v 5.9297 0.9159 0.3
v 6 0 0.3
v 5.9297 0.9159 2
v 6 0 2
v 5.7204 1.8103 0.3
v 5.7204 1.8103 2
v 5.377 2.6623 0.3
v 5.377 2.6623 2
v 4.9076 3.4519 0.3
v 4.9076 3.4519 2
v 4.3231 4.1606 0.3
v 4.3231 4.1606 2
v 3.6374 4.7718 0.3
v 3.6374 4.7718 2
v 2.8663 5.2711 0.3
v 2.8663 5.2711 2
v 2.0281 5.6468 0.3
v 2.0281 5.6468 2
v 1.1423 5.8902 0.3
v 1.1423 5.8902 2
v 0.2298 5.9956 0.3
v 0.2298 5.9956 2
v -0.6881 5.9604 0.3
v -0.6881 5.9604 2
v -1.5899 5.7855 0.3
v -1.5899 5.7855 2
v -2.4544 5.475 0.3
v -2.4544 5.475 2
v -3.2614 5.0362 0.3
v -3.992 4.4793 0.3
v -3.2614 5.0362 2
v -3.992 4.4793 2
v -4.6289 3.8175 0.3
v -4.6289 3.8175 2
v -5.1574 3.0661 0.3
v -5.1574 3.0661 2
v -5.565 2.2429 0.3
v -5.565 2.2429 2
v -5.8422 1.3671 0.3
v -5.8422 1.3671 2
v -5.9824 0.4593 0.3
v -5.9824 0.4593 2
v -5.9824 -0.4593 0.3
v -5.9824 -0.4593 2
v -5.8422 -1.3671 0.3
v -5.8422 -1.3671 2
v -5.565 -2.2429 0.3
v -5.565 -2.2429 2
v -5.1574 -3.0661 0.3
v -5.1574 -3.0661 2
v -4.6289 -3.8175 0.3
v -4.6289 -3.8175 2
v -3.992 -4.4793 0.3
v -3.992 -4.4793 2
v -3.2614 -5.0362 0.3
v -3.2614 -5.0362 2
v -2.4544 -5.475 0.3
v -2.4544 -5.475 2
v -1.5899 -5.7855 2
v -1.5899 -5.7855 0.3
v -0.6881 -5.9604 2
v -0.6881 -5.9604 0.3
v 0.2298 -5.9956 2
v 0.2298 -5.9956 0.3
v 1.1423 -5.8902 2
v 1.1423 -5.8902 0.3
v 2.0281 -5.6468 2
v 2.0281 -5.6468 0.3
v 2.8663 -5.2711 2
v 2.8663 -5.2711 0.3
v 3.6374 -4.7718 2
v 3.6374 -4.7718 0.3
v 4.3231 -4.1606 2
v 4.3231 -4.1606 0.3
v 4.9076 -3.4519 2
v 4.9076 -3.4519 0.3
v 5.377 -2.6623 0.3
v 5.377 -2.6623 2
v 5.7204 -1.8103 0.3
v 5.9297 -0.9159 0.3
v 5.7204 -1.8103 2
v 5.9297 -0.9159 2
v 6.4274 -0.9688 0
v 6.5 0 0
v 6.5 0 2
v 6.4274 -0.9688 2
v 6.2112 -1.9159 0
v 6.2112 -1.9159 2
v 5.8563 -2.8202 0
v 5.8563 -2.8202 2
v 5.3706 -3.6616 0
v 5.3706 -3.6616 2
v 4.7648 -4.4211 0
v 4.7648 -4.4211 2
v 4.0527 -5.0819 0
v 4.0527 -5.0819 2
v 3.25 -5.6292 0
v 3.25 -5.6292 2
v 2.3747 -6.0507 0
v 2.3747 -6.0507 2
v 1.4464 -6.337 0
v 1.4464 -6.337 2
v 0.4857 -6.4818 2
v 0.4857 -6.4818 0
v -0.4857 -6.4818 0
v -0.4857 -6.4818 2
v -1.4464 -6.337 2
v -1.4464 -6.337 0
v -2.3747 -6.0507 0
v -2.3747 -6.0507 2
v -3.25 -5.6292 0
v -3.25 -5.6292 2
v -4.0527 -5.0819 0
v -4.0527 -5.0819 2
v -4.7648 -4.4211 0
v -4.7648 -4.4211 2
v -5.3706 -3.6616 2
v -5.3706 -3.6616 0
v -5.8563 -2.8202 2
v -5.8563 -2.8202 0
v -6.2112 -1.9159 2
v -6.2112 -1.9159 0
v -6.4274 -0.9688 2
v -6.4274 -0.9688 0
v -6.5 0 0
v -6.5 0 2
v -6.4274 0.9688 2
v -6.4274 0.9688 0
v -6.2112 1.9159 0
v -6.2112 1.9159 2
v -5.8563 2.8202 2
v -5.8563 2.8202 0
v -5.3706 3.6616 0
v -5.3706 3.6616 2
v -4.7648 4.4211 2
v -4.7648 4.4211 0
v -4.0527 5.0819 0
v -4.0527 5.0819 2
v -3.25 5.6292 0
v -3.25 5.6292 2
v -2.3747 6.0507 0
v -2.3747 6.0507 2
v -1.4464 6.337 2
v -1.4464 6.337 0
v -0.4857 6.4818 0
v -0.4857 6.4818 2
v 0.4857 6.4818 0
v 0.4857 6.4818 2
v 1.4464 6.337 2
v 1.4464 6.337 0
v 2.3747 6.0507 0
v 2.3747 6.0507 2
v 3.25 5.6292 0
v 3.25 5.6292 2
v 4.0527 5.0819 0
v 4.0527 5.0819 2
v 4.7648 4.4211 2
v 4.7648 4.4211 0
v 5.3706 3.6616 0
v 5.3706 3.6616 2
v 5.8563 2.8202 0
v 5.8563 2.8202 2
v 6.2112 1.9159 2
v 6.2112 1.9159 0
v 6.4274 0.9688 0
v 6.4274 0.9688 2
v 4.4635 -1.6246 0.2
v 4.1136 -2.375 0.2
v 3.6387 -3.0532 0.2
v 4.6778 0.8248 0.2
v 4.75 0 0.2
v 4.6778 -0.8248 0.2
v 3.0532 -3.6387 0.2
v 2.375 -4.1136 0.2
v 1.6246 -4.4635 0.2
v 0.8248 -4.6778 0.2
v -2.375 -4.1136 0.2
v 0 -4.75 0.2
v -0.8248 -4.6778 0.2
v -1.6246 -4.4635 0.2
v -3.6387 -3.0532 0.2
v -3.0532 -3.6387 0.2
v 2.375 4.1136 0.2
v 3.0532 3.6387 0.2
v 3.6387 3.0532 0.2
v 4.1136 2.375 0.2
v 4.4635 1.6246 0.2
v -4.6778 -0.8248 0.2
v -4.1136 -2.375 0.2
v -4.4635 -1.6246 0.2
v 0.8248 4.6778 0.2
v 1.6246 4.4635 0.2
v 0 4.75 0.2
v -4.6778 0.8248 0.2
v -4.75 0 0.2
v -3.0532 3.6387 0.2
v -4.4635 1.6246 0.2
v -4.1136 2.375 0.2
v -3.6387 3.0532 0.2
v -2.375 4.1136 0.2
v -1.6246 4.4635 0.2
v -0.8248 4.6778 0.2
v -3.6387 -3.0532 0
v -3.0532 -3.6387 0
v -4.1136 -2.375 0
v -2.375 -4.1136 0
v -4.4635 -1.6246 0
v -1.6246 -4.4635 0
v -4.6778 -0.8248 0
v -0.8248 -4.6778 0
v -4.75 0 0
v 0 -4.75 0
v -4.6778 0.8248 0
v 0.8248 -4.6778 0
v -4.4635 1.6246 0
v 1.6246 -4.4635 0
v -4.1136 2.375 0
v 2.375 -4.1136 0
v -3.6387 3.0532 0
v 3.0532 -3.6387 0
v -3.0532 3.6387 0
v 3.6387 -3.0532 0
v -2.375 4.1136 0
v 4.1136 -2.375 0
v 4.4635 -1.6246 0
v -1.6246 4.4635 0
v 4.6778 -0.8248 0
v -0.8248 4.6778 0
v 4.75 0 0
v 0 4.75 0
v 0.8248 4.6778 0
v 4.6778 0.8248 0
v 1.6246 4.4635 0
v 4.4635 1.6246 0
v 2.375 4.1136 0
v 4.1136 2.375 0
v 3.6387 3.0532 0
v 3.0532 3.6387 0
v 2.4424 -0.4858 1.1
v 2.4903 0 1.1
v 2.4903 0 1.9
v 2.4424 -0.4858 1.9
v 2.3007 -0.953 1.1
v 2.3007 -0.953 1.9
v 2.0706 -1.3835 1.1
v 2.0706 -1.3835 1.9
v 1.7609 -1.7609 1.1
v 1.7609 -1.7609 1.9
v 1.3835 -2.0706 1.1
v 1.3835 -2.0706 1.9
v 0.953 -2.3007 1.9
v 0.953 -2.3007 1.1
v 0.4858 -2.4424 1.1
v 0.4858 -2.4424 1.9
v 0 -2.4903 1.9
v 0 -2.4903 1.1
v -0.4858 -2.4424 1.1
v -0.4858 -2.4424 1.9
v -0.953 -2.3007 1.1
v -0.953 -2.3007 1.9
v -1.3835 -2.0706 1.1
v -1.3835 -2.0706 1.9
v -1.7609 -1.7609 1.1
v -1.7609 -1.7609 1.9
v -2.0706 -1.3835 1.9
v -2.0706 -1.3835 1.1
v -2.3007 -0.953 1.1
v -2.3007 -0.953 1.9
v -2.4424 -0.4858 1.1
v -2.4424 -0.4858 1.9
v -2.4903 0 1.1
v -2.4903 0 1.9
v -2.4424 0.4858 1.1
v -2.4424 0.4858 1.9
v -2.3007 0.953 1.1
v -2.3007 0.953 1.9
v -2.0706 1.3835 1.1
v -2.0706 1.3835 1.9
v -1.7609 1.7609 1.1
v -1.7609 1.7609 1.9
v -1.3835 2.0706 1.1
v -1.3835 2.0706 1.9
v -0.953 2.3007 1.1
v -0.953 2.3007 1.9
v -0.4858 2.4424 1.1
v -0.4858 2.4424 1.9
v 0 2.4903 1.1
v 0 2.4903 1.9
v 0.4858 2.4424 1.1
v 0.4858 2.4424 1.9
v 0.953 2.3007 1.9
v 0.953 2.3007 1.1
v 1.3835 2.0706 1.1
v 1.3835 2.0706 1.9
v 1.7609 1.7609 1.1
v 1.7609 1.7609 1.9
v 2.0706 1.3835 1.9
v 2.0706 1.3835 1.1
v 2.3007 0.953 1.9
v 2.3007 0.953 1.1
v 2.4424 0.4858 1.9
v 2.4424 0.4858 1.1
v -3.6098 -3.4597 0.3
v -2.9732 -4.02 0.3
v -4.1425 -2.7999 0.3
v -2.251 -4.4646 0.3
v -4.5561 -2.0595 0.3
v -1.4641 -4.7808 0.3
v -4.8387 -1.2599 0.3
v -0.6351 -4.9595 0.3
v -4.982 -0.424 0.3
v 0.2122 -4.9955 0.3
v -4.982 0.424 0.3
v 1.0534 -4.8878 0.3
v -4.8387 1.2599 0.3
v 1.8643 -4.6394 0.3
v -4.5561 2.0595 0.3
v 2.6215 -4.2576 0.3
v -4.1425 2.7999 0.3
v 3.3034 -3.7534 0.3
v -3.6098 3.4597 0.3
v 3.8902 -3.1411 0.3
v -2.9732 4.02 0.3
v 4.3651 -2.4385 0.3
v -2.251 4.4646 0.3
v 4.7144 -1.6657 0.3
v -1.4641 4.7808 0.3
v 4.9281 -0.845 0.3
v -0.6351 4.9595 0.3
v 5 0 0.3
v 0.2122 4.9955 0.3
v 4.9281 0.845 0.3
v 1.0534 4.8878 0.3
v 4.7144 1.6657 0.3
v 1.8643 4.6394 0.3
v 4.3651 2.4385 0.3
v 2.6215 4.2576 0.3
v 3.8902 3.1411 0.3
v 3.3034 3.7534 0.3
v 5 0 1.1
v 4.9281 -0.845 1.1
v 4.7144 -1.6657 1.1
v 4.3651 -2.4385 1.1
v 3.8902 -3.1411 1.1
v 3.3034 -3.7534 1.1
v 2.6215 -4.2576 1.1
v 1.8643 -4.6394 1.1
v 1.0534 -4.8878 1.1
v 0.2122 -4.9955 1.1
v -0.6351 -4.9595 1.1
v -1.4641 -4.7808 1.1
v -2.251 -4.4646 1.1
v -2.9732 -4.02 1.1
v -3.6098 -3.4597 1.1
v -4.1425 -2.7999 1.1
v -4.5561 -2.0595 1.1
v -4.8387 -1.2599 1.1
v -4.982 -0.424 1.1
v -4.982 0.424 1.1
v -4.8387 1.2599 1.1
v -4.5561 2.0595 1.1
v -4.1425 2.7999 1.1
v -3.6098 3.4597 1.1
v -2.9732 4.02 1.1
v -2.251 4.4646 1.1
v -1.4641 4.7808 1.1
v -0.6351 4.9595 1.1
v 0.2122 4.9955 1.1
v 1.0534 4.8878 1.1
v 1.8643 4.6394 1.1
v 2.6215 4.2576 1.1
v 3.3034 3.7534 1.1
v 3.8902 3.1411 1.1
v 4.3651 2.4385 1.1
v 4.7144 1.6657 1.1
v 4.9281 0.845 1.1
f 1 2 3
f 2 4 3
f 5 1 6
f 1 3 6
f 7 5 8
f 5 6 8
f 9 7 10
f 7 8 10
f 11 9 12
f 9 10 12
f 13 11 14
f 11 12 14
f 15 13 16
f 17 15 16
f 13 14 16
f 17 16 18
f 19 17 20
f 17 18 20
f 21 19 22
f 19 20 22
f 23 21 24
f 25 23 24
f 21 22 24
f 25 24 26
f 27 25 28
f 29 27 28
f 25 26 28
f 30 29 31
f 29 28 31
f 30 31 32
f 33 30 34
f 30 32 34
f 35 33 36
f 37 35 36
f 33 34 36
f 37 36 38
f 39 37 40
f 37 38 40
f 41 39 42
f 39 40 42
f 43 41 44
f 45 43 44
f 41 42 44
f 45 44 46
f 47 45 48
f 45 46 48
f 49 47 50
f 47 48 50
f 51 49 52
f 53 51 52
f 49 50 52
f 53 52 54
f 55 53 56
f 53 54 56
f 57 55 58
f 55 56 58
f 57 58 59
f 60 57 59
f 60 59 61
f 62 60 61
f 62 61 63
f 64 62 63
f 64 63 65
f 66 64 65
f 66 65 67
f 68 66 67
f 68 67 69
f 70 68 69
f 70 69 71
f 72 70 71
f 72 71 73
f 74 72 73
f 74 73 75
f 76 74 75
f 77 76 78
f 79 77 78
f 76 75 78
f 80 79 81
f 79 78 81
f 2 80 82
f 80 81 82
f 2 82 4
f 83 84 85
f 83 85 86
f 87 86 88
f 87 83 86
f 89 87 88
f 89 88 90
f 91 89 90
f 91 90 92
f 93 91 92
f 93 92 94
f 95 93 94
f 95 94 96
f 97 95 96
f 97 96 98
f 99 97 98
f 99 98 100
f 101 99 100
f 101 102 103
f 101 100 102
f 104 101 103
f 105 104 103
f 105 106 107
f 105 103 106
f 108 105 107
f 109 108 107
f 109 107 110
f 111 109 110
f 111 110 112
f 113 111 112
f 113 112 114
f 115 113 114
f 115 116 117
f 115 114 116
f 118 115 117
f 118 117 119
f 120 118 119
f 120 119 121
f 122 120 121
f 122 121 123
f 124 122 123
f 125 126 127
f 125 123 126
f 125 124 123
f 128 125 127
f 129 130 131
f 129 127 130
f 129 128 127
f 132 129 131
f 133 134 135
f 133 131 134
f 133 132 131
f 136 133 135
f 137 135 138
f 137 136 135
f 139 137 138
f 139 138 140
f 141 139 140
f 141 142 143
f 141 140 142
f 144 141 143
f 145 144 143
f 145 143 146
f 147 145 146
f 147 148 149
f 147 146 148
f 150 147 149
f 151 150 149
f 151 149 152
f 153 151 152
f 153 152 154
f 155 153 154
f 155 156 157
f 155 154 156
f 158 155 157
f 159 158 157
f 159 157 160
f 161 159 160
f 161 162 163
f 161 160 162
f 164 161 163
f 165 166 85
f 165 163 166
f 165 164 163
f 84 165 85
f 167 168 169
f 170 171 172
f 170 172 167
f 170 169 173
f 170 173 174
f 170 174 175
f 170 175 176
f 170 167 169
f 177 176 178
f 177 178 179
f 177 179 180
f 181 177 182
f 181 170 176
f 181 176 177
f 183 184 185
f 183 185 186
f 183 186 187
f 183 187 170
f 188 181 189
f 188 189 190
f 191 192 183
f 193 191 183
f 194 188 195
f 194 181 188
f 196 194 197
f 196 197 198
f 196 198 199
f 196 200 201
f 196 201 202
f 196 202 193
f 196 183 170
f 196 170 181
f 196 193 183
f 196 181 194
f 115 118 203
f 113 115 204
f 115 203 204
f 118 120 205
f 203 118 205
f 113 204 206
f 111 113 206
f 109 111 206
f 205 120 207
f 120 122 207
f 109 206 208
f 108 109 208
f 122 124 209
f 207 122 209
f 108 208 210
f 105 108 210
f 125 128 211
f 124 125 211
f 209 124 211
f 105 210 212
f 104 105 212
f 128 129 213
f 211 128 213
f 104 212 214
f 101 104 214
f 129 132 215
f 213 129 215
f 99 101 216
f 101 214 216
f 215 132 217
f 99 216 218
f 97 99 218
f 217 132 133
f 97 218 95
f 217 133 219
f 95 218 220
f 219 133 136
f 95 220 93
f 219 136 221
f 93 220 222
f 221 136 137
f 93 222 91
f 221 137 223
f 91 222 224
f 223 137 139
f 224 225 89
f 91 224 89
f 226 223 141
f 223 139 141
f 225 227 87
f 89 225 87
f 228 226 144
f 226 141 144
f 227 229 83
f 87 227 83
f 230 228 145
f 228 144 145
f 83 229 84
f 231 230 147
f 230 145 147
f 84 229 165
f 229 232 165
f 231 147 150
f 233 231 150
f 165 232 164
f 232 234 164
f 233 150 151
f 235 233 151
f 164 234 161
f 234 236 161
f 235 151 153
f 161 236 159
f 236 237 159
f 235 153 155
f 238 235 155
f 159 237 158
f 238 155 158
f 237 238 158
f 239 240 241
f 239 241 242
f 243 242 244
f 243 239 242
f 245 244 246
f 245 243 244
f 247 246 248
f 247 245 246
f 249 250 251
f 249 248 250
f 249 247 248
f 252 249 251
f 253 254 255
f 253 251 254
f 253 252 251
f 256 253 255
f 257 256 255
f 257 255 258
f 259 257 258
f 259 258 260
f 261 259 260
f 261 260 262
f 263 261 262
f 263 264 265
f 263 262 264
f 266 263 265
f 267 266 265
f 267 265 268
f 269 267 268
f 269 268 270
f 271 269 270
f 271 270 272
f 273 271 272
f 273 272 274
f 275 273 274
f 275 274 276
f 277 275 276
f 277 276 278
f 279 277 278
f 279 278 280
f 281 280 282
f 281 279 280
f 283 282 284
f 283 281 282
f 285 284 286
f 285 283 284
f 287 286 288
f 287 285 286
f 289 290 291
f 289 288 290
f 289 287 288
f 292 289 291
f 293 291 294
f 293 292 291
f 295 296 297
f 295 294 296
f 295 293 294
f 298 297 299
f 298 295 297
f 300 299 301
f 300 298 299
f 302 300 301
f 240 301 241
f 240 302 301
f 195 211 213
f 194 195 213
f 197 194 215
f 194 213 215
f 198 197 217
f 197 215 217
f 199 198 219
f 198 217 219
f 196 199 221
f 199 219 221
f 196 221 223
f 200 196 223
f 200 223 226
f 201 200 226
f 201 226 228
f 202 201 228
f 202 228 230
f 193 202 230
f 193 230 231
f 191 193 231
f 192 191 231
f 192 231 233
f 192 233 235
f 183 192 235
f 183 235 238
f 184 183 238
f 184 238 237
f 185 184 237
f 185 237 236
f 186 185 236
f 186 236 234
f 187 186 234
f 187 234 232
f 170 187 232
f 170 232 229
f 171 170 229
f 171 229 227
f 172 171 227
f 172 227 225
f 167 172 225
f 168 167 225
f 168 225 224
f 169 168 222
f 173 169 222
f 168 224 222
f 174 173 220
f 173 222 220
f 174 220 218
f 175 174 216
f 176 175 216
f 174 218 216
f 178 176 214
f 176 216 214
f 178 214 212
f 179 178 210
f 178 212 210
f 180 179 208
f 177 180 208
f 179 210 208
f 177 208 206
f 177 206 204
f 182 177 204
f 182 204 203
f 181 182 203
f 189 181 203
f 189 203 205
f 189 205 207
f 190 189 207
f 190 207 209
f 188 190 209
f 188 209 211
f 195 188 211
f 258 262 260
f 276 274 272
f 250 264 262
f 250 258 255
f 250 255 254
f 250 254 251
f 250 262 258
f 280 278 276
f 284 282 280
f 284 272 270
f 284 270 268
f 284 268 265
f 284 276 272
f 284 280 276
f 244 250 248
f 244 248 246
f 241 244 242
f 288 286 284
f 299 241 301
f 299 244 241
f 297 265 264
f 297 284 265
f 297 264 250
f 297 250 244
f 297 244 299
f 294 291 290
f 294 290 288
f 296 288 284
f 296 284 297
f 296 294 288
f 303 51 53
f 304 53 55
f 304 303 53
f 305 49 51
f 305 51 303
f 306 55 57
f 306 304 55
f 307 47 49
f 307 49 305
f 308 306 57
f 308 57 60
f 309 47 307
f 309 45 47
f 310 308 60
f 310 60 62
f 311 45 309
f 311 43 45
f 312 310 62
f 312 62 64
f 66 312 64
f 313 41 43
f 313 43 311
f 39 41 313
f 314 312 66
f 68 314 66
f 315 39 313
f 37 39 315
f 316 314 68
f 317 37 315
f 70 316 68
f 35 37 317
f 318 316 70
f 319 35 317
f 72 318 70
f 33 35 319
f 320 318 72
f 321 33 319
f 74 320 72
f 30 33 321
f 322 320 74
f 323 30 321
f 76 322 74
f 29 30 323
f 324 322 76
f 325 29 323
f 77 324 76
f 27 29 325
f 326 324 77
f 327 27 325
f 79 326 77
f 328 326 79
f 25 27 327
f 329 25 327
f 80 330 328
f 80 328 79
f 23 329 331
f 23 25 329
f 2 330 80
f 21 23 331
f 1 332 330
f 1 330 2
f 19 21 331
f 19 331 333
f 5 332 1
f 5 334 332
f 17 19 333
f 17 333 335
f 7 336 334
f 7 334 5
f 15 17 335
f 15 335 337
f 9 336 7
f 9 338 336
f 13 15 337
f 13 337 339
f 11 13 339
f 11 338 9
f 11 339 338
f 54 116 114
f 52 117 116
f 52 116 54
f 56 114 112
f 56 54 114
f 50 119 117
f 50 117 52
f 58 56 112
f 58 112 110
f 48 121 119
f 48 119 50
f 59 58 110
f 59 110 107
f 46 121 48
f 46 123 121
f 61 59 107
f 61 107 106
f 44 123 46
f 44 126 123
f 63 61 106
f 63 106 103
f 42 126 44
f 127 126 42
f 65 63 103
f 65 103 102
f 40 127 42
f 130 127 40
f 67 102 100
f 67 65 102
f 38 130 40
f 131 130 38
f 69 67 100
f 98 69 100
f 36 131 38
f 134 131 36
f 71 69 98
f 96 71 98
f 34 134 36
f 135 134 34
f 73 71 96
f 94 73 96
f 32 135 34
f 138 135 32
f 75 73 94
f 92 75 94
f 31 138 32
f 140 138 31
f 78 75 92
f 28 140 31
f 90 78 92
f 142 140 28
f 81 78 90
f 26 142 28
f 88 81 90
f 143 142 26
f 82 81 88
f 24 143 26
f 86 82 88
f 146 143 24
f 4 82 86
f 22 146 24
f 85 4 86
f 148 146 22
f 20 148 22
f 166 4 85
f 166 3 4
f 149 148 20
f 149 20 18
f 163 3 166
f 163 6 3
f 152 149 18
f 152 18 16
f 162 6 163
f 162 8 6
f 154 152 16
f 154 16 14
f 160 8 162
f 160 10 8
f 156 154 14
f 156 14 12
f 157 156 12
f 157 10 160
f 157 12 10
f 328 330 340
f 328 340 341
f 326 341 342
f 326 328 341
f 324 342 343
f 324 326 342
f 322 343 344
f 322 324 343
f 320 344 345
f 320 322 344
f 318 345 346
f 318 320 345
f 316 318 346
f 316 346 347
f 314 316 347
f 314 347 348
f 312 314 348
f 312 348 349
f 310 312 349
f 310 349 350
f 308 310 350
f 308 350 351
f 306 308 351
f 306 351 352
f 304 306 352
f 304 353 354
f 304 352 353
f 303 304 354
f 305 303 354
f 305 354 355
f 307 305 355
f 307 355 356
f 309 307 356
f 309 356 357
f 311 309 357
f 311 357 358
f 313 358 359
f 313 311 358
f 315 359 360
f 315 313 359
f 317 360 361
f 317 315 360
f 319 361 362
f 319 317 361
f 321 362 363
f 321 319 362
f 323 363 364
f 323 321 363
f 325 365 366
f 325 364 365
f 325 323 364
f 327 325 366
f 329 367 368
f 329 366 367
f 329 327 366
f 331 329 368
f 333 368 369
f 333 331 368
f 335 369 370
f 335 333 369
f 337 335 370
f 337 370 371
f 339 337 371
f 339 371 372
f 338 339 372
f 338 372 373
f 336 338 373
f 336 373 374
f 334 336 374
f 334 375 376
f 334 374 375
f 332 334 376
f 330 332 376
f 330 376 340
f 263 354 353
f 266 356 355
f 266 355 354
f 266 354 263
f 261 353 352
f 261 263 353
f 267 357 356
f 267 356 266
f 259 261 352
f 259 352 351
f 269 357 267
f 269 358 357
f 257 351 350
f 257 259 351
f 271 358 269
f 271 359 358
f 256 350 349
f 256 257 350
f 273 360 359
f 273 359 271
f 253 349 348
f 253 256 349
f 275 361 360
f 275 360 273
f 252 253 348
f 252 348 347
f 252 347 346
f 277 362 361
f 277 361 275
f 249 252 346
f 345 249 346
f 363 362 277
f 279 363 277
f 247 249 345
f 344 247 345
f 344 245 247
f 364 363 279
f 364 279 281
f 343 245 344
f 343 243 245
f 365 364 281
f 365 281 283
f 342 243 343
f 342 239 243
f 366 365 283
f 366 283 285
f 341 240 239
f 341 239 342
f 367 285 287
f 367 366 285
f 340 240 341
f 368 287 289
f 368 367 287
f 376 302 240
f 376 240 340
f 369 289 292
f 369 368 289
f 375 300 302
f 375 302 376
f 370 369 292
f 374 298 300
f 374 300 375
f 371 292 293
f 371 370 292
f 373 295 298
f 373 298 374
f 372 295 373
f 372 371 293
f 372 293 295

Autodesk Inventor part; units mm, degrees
ref_plane "YZ Plane" through (0, 0, 0) normal (1, 0, 0) x (0, 1, 0)
ref_plane "XZ Plane" through (0, 0, 0) normal (0, 1, 0) x (-1, 0, 0)
ref_plane "XY Plane" through (0, 0, 0) normal (0, 0, 1) x (1, 0, 0)
sketch "Skizze1" plane through (0, 0, 0) normal (0, 0, 1) x (1, 0, 0)
  circle A0 centre (0, 0) radius 6.5
  dimension "d2" = 13
extrude "Extrusion1" add sketch "Skizze1" along normal blind 2
sketch "Skizze2" plane through (0, 0, 2) normal (0, 0, 1) x (1, 0, 0)
  circle A0 centre (0, 0) radius 6
  dimension "d3" = 12
extrude "Extrusion2" cut sketch "Skizze2" against normal blind 1.7
sketch "Skizze3" plane through (0, 0, 0.3) normal (0, 0, 1) x (1, 0, 0)
  circle A0 centre (0, 0) radius 5
  dimension "d6" = 10
extrude "Extrusion3" add sketch "Skizze3" along normal blind 0.8
sketch "Skizze4" plane through (0, 0, 1.1) normal (0, 0, 1) x (1, 0, 0)
  circle A0 centre (0, 0) radius 2.4903
extrude "Extrusion4" add sketch "Skizze4" along normal blind 0.8
sketch "Skizze5" plane through (0, 0, 0) normal (0, 0, -1) x (-1, 0, 0)
  circle A0 centre (0, 0) radius 4.75
  dimension "d11" = 9.5
extrude "Extrusion5" cut sketch "Skizze5" against normal blind 0.2
properties part number "Gummipad" material "Glas"
